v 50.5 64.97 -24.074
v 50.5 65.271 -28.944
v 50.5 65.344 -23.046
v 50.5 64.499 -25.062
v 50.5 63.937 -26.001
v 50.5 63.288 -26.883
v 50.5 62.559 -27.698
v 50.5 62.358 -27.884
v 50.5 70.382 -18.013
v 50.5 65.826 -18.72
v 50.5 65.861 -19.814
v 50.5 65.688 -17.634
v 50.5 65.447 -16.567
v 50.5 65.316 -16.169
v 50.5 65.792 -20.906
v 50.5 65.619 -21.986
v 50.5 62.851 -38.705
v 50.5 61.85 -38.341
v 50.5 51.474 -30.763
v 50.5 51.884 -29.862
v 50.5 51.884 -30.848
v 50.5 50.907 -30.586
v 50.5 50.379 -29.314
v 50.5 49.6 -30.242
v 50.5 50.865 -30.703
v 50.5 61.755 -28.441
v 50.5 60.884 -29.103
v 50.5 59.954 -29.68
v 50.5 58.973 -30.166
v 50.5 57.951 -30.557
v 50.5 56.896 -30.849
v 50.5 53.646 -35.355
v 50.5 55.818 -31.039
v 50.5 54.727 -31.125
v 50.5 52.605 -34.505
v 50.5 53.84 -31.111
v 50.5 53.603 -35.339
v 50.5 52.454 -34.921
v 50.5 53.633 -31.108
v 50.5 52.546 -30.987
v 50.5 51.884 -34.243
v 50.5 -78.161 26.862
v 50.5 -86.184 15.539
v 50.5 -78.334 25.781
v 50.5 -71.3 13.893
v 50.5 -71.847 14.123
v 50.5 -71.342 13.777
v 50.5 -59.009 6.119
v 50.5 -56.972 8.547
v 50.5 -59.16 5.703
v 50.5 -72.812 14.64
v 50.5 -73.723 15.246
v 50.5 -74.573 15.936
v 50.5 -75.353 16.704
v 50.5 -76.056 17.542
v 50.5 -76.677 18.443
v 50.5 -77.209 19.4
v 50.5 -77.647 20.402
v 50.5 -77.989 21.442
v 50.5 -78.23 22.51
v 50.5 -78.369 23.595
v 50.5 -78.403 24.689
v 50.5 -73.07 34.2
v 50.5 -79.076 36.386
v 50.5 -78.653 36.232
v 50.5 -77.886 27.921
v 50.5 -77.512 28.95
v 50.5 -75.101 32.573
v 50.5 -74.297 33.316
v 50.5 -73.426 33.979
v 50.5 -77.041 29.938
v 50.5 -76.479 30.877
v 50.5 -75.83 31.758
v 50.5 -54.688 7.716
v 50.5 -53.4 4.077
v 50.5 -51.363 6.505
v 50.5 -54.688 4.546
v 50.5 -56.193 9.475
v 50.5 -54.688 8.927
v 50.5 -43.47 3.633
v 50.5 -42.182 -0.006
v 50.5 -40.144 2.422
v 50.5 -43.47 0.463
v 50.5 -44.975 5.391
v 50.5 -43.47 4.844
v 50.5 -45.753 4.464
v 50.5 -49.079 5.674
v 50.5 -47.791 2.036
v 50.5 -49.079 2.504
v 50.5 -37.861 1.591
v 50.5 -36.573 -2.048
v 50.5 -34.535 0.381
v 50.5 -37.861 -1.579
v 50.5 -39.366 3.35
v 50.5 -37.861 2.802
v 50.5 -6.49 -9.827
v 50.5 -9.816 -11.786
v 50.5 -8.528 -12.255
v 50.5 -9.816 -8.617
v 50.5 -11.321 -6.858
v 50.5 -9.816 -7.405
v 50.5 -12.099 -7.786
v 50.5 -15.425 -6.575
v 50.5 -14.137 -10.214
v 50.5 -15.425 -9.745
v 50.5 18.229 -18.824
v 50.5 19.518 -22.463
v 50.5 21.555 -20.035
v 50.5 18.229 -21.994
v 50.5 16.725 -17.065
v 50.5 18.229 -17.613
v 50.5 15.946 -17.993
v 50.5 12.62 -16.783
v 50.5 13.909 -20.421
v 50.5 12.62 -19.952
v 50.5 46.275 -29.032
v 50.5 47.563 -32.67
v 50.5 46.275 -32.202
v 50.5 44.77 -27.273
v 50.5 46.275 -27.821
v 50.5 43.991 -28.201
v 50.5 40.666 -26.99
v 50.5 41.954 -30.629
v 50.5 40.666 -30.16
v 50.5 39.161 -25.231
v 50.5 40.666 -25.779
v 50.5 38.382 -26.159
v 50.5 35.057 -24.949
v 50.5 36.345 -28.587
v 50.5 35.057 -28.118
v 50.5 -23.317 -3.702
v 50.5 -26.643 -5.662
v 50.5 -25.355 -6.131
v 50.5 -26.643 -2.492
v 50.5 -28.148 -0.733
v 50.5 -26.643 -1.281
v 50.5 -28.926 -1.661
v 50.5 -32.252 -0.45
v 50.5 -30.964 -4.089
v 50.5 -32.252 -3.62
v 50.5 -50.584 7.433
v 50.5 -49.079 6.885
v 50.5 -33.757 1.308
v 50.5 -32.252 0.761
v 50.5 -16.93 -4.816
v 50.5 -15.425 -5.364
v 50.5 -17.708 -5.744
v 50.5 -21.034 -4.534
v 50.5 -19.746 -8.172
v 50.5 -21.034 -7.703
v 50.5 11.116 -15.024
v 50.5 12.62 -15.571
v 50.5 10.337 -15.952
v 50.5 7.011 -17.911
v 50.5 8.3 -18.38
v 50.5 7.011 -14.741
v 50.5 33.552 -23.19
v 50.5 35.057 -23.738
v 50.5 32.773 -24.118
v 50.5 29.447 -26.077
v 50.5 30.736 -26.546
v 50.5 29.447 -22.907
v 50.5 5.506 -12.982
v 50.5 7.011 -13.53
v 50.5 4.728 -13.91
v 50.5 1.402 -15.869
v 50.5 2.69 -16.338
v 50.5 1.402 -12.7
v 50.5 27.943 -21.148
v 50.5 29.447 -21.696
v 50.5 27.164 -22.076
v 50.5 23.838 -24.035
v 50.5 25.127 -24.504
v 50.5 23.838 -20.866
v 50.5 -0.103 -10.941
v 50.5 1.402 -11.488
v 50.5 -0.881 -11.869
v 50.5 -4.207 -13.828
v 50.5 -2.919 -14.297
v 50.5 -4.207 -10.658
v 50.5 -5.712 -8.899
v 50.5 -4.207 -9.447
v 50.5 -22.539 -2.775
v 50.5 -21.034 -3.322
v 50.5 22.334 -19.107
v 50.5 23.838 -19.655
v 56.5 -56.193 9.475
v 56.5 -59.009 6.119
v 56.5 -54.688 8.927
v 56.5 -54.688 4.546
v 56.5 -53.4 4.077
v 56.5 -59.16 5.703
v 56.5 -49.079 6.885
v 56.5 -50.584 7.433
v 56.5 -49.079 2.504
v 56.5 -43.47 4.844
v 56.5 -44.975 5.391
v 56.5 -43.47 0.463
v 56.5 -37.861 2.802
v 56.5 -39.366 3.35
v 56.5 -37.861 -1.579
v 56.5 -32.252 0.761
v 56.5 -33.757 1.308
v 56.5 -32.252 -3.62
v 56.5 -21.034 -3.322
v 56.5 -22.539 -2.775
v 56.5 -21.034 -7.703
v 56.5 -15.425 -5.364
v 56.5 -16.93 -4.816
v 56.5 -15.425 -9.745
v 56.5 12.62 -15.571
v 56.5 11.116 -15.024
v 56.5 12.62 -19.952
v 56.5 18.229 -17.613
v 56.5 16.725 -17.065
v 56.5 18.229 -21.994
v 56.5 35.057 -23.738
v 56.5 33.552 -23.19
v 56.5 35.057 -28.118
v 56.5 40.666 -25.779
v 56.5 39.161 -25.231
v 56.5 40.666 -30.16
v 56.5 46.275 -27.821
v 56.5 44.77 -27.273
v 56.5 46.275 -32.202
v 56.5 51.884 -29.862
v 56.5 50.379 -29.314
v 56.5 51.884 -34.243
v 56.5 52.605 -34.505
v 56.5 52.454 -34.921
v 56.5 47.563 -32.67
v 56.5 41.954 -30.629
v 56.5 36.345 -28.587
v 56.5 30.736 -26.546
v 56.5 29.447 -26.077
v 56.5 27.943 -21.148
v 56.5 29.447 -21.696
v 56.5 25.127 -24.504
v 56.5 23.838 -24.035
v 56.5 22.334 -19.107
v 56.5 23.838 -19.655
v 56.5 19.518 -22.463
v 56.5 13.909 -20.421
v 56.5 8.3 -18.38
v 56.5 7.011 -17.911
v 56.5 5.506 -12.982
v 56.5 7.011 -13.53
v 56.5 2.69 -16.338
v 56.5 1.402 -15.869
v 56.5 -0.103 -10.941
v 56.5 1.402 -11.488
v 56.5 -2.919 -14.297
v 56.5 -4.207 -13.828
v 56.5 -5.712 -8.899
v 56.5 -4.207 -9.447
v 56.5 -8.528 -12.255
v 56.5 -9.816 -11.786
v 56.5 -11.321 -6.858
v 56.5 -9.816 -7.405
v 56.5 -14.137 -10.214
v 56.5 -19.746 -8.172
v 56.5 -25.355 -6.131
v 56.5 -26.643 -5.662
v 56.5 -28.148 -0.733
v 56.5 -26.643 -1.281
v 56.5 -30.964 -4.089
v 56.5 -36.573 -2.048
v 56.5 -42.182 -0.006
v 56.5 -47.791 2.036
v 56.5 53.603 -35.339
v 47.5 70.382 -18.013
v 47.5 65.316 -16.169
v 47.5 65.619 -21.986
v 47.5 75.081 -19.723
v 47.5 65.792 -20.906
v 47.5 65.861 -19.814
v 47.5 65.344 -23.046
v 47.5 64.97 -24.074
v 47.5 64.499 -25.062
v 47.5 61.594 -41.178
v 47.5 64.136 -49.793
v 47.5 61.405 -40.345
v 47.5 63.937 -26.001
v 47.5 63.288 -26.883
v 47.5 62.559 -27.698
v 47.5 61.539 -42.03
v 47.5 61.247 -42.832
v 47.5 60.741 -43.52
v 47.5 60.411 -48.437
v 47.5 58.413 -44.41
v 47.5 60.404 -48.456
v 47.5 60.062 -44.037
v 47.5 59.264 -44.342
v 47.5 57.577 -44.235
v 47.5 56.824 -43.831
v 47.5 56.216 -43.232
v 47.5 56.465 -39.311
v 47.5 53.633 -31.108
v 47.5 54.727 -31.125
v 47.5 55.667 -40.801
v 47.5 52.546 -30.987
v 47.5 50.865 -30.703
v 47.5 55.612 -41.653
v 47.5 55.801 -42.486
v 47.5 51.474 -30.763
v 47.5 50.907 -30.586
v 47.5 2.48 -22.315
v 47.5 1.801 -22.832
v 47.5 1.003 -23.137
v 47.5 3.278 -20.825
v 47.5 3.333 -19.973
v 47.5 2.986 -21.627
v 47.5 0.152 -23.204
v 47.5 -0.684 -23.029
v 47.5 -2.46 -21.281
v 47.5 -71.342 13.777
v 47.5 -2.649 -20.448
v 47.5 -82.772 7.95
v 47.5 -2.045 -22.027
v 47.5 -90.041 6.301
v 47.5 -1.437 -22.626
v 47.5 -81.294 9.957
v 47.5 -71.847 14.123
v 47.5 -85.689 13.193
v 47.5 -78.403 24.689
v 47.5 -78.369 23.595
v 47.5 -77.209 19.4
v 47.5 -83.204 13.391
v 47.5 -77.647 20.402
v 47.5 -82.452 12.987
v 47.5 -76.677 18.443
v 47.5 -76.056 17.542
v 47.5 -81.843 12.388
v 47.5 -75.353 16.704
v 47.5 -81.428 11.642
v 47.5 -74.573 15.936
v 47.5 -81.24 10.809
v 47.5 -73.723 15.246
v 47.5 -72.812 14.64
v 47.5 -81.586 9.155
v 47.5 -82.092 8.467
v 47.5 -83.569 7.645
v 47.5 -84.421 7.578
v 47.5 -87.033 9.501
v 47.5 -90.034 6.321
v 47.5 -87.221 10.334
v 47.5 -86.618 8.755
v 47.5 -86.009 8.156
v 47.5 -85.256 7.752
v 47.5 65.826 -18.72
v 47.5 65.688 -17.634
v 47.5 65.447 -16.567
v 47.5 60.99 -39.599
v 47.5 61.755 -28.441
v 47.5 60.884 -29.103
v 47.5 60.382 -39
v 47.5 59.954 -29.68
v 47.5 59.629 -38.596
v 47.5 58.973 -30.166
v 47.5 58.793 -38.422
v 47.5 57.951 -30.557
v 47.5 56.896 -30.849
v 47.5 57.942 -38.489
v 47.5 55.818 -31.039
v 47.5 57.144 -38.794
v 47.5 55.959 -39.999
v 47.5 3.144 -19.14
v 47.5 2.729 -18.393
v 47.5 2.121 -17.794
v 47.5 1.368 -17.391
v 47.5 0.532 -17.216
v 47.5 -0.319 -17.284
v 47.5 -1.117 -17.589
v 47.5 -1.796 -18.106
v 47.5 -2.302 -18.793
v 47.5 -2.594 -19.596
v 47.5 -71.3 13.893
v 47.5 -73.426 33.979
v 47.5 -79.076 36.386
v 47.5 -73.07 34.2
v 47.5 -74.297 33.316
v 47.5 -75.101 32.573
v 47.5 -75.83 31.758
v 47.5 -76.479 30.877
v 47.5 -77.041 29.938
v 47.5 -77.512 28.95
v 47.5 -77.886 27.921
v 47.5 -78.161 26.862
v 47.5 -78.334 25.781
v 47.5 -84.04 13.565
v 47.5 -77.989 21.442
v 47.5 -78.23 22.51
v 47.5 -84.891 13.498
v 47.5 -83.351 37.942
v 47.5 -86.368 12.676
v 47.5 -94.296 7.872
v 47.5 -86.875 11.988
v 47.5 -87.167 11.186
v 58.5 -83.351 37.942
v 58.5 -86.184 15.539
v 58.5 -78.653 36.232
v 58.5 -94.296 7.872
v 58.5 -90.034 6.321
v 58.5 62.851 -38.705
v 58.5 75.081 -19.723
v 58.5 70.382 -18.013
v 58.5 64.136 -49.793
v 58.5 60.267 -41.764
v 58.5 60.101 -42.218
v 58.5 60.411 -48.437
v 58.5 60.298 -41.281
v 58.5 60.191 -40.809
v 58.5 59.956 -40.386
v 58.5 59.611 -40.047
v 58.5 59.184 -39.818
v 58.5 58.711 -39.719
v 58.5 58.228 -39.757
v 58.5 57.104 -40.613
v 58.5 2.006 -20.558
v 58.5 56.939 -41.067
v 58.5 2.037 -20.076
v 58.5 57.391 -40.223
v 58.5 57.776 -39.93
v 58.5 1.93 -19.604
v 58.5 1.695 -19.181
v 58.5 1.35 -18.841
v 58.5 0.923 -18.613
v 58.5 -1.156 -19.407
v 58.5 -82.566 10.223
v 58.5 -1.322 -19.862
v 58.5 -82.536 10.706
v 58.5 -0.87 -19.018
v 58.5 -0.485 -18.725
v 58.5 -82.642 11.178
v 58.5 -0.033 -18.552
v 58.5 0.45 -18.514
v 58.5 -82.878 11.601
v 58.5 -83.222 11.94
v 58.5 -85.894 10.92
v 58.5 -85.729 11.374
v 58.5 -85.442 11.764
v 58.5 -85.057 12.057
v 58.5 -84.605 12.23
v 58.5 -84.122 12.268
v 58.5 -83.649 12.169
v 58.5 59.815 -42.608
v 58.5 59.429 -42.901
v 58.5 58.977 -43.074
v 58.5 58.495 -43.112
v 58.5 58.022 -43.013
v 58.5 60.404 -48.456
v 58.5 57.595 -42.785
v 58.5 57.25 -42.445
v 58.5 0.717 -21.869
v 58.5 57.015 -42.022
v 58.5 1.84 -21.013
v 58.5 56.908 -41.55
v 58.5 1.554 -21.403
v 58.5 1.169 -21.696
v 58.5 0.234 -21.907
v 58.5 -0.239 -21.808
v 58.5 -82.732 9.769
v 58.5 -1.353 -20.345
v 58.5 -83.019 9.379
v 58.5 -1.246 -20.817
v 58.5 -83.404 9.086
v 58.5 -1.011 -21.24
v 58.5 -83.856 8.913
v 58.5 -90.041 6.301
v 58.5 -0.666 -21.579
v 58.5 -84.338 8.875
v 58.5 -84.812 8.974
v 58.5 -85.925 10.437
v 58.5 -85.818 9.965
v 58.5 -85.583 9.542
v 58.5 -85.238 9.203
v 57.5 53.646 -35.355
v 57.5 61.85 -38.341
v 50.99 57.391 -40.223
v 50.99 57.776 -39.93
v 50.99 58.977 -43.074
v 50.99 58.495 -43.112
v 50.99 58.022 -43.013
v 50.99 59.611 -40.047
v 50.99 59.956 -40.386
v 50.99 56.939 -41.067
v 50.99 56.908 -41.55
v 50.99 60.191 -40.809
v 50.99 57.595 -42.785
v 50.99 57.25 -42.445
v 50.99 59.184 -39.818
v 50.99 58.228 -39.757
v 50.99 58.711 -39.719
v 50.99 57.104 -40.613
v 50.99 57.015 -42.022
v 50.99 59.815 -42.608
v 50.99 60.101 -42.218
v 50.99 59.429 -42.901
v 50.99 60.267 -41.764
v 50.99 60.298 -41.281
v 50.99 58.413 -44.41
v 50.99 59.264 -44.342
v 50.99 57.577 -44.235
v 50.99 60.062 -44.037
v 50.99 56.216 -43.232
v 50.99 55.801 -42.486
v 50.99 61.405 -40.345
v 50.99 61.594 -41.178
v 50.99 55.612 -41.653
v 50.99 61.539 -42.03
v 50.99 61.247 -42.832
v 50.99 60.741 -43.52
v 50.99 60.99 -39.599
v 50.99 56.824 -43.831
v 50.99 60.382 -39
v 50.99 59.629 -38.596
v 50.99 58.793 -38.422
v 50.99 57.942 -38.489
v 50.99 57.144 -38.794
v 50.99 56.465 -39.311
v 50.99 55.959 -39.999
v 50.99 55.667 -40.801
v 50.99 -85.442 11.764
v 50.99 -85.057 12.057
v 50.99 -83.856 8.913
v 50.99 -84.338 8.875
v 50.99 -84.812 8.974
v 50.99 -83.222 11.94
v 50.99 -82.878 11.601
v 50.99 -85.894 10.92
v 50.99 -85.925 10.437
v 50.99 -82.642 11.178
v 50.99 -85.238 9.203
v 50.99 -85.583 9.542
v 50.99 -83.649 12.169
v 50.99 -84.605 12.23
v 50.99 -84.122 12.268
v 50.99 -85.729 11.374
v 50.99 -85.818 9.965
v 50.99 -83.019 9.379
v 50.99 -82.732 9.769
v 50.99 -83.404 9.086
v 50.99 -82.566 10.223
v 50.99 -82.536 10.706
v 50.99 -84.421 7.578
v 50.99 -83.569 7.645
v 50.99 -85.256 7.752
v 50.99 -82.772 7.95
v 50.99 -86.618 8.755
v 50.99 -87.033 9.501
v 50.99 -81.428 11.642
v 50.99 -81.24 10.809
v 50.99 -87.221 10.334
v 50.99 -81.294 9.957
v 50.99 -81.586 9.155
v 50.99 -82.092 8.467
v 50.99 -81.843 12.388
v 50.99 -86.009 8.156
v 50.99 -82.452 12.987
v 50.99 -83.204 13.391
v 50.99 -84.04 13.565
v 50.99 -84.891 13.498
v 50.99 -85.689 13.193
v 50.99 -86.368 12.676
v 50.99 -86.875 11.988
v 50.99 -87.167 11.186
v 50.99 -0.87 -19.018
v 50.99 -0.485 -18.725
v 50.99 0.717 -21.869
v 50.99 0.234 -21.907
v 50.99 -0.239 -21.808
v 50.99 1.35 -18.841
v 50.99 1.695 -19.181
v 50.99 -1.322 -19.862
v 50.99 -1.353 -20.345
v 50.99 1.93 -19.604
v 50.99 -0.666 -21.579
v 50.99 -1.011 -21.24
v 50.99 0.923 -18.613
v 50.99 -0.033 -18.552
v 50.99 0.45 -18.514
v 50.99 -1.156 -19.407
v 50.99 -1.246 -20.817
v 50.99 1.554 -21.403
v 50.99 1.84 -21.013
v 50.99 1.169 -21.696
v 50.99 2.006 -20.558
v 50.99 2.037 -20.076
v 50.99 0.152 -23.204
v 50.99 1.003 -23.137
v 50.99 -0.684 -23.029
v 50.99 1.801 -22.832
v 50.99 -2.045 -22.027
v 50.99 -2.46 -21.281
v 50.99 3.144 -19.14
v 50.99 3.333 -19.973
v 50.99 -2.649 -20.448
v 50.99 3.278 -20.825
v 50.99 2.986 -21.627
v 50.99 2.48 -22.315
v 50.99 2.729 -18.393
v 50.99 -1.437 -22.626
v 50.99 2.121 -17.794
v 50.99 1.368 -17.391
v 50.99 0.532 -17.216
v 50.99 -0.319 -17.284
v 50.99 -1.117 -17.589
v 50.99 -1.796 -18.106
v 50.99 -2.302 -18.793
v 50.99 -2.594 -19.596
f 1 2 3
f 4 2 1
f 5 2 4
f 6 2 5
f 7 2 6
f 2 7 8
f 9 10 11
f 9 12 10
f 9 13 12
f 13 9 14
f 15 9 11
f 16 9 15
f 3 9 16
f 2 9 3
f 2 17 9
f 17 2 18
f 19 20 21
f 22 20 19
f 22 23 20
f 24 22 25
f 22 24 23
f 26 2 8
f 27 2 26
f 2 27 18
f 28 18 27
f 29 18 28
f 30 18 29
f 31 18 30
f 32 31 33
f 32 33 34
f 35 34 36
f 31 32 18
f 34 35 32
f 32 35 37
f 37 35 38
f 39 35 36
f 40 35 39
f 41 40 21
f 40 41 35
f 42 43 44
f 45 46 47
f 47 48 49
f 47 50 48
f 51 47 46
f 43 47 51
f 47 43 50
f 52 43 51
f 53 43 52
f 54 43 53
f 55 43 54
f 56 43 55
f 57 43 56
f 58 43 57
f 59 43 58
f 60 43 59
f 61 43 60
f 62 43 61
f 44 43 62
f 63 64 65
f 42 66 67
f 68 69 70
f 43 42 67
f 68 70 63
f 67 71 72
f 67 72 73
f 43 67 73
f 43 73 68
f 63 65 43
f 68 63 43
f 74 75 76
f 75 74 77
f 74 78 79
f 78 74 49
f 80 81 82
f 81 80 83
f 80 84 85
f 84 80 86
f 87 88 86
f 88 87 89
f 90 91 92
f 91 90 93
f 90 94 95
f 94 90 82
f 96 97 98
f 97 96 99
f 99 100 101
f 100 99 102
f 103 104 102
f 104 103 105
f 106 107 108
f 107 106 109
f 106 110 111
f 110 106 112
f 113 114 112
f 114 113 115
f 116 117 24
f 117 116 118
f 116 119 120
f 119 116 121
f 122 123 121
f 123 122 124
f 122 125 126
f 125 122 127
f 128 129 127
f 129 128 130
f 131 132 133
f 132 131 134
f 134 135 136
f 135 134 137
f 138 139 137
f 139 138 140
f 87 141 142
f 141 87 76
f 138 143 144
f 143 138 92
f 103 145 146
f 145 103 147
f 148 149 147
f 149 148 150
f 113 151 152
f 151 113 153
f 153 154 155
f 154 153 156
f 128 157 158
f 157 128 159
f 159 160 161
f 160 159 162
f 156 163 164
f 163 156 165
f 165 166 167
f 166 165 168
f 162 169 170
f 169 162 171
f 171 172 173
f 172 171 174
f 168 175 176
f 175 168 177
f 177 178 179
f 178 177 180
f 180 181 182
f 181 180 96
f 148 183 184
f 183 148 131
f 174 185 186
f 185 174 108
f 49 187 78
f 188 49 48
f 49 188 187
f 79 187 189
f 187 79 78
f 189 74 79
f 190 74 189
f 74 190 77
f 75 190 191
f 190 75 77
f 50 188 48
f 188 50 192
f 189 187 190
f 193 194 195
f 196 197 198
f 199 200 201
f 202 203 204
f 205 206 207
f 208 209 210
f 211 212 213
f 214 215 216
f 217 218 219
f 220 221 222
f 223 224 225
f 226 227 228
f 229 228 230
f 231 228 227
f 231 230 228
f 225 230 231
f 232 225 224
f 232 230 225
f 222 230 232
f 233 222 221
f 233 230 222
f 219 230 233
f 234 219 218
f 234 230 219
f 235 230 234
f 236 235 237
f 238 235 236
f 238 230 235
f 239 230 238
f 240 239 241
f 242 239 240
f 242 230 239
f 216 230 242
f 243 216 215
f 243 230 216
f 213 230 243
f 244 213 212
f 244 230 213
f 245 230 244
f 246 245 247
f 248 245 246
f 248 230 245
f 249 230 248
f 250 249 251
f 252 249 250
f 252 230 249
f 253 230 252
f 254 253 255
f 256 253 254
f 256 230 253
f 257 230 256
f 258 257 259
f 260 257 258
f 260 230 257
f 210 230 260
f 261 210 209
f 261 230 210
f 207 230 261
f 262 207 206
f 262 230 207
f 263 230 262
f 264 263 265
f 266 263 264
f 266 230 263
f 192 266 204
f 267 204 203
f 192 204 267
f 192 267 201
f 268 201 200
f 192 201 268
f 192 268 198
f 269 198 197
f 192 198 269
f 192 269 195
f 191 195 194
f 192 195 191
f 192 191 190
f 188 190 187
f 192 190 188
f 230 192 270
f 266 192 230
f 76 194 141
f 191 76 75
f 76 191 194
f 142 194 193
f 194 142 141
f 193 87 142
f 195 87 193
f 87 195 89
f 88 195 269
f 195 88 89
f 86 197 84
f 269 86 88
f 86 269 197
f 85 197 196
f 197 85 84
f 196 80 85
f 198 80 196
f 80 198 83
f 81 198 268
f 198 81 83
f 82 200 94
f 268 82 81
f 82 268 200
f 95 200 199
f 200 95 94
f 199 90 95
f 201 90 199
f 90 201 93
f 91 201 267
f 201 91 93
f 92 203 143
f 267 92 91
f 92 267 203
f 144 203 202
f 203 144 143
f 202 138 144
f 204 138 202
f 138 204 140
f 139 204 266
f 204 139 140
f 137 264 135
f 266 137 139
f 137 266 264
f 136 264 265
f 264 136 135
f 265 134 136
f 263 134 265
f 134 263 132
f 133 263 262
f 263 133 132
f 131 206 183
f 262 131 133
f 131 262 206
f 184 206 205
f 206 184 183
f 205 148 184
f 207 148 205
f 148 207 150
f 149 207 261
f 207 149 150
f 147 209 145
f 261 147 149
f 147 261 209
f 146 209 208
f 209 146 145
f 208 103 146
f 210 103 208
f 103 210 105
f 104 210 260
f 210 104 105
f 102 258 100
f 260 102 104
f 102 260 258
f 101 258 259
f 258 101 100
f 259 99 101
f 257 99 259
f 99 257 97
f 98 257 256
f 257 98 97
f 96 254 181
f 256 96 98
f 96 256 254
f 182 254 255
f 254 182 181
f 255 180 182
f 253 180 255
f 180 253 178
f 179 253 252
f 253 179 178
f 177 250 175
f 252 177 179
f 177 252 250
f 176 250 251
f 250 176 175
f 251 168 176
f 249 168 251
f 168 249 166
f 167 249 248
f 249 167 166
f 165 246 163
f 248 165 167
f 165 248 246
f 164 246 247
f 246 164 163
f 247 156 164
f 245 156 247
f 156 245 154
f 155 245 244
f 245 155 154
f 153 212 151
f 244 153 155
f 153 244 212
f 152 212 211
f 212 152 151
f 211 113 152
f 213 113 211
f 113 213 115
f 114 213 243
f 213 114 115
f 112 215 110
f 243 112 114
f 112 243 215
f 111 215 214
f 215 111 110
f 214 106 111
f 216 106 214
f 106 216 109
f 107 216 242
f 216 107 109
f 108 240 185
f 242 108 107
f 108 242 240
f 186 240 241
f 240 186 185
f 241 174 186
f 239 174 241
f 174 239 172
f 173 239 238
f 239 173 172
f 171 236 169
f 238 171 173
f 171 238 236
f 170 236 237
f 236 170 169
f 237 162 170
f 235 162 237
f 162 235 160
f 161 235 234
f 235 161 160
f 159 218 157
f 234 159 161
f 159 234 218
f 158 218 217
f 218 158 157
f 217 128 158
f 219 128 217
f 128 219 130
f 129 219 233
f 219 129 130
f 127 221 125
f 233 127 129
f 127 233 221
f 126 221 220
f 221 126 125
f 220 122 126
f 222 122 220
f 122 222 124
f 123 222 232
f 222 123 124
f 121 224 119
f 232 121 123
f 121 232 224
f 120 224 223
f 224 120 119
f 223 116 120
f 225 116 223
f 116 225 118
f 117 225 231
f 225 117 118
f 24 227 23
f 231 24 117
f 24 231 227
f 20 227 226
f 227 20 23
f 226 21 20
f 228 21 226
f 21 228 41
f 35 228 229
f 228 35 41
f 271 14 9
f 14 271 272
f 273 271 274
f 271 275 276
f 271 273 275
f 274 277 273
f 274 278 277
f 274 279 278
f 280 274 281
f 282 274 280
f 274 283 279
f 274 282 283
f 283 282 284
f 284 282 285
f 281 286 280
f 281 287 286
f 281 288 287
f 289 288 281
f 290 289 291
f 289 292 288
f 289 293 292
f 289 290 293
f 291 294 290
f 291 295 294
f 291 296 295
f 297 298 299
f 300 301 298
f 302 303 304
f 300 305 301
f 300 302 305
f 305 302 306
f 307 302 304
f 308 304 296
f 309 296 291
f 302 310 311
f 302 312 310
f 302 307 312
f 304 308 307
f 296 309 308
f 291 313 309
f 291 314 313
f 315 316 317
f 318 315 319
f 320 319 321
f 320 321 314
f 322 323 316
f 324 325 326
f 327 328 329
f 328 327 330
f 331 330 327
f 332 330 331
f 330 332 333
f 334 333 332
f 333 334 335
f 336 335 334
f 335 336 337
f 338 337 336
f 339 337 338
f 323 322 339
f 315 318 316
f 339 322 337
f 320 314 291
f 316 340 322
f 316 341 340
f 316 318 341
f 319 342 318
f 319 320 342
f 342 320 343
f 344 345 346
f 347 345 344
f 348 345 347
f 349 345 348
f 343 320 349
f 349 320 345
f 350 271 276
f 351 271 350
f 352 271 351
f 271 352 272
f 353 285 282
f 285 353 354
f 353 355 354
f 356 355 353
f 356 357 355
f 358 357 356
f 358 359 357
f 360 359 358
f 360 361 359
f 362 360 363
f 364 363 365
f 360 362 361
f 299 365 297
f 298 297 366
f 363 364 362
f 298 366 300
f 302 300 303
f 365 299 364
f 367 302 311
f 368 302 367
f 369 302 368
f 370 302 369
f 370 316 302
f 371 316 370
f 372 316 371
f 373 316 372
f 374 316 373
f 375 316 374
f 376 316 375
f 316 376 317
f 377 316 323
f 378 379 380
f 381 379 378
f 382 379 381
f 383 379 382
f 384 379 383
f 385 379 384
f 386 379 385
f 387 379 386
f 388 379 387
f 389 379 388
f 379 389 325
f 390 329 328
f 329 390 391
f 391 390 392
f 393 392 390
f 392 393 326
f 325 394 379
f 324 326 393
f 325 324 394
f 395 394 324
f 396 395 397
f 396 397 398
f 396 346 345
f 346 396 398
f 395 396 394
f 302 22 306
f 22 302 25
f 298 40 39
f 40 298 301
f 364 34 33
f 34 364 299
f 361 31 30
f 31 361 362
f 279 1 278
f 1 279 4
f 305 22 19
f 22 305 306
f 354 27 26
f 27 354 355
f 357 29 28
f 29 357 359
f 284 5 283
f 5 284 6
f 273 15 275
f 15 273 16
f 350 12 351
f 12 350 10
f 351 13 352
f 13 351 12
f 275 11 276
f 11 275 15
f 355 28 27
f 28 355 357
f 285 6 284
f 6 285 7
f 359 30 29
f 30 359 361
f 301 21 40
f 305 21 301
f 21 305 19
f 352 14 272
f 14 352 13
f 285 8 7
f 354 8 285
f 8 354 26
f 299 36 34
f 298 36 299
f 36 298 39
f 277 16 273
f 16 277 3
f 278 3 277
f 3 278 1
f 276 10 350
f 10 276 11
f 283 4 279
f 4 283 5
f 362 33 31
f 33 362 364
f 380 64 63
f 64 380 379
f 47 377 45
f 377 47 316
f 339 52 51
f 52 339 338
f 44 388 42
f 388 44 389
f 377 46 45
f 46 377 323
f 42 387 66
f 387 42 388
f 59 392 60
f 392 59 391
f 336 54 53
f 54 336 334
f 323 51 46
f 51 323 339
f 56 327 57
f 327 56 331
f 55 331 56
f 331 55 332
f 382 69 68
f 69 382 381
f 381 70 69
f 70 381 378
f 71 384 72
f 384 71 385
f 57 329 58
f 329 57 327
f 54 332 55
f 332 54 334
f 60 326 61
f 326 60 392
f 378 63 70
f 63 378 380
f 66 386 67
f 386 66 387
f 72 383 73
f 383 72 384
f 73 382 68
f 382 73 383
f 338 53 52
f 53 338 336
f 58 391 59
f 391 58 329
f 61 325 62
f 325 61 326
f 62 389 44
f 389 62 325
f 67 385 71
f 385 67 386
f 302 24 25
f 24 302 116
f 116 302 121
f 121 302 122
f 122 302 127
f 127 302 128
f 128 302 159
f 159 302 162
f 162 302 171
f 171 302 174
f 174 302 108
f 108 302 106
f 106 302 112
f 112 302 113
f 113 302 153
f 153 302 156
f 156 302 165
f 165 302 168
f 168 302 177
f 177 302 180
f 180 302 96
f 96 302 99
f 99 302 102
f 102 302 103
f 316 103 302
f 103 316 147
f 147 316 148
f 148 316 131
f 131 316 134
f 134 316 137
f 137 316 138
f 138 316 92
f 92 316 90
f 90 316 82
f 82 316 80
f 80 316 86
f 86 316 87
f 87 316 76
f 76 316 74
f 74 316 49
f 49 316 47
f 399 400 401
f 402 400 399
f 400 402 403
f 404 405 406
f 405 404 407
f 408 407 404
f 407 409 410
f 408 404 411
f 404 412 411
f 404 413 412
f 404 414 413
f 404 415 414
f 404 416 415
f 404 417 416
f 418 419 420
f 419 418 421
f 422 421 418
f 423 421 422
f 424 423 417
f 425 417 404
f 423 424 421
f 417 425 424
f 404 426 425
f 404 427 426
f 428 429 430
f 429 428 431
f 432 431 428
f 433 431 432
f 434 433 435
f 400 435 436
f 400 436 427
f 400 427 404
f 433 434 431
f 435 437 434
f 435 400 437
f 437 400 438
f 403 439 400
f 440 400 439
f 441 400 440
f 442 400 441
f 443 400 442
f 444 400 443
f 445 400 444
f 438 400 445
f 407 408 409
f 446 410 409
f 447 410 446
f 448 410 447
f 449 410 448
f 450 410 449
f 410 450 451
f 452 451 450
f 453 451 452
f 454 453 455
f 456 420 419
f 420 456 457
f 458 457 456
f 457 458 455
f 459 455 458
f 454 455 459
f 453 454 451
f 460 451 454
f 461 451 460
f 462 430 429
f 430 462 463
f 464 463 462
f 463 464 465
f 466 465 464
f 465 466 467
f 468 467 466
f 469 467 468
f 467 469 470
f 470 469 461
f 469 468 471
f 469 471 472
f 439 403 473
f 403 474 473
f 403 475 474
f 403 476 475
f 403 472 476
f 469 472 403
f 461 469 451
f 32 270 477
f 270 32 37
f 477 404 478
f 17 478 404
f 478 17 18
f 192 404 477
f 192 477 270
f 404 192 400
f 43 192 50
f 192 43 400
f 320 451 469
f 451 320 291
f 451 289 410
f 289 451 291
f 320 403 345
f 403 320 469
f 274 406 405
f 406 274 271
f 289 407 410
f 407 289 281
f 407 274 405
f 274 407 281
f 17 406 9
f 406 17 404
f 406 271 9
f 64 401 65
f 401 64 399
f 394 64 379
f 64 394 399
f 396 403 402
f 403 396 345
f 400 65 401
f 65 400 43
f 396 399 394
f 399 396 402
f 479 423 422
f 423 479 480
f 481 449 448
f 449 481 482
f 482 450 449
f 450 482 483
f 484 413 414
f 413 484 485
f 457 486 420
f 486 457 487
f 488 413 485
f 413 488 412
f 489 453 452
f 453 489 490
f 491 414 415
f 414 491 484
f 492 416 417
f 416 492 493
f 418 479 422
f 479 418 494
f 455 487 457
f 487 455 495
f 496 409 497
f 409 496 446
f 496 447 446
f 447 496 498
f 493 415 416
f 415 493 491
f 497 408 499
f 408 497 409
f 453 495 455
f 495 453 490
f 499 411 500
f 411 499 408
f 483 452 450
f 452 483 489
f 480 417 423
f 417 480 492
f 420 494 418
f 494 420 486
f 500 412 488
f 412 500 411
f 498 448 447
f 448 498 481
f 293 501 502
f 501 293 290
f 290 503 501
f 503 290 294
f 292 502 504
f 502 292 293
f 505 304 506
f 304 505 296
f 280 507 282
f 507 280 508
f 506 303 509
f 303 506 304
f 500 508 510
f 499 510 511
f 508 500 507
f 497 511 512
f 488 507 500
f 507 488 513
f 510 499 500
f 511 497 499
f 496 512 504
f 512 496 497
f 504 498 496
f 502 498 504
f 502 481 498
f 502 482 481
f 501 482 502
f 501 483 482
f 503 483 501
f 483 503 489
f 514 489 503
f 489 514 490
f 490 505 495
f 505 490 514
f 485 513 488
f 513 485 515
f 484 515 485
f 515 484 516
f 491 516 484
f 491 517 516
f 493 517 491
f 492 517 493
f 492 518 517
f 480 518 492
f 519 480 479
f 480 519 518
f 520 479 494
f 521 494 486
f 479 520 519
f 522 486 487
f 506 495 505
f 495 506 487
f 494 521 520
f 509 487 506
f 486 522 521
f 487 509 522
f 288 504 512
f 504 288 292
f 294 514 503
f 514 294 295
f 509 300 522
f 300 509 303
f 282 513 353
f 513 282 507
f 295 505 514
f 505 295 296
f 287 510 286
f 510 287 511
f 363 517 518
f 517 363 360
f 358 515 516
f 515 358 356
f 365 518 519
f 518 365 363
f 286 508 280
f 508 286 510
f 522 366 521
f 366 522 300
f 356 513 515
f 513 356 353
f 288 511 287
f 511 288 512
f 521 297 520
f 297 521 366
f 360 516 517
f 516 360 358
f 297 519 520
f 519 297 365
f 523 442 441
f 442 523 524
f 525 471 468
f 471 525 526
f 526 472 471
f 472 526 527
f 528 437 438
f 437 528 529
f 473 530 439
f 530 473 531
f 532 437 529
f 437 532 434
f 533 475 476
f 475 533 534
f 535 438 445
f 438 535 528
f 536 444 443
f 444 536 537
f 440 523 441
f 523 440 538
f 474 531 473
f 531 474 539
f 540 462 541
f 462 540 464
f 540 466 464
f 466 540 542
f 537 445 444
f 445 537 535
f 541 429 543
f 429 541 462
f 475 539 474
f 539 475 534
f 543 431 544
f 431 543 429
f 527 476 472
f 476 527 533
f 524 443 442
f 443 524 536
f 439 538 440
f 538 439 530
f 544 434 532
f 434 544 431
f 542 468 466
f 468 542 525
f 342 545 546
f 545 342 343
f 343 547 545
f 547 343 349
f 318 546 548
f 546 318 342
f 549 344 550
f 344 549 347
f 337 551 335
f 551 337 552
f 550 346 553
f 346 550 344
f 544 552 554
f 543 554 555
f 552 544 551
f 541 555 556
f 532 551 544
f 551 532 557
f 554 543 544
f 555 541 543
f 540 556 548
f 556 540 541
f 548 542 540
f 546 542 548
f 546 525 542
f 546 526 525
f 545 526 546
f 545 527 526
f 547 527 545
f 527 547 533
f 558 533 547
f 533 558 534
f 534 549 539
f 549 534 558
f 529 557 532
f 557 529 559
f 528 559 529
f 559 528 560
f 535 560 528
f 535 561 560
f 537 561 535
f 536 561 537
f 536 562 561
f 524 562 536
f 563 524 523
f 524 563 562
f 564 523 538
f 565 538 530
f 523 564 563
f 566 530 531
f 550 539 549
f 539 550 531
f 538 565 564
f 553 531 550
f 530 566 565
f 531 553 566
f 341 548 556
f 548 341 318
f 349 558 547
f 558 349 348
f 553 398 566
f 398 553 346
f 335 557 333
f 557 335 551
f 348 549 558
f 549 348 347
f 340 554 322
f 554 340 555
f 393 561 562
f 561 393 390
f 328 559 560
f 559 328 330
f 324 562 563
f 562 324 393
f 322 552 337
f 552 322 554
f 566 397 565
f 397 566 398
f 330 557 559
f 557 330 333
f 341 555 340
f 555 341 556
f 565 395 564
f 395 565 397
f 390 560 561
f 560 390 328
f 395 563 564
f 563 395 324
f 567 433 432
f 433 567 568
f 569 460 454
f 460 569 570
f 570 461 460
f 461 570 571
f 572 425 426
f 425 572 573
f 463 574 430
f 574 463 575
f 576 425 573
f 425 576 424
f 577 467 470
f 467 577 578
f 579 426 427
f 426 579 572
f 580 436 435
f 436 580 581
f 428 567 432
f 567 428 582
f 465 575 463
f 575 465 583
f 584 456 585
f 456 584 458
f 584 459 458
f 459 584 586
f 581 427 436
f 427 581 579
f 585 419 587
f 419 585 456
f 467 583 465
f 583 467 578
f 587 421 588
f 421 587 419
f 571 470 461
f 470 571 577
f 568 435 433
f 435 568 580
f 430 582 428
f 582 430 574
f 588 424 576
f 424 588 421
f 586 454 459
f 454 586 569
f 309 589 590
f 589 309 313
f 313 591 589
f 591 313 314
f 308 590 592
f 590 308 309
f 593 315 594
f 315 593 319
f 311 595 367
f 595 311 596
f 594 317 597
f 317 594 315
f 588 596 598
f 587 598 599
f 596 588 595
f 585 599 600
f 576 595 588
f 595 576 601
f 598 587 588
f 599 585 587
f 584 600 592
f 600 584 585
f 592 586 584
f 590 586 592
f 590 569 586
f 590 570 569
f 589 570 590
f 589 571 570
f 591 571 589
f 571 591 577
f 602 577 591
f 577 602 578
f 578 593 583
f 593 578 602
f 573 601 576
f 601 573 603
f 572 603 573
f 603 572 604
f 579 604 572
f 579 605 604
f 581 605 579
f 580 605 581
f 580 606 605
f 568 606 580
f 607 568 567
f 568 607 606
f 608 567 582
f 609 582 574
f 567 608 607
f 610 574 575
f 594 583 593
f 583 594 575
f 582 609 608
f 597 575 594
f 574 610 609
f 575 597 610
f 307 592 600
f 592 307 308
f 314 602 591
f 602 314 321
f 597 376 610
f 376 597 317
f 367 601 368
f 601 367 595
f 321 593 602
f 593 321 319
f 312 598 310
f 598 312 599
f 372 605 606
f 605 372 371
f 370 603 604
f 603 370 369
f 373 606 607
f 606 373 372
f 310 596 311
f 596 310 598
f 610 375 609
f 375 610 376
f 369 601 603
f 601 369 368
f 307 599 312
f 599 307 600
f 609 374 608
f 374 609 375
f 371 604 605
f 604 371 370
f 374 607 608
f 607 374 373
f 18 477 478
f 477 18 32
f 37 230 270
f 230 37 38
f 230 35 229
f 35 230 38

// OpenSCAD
// file: ../Parts/rounder.scad
// rounder.scad
// cutting tool for rounding off corners with a cylinder

//---------------------
module rounder(
r=10,   // radius
h=10,   // height
f=22,    // $fn
extra=0.01  // extra size for the cube
){

difference(){
  translate([-extra,-extra,-extra])
  cube([r+extra,r+extra,h+2*extra]);
  translate([r,r,-1])
  cylinder(r=r,h=h+2,$fn=f);
}

}

//---------------------------------------------------------------------------
module bevel(x=1,y=1,h=10){

linear_extrude(height=h)
polygon(points=[[0,0],[x,0],[0,y]]);
    
}
  

//========================

rounder();

//========================
// main file
//======================================================================
// RewinderRamp.scad
//
// New version of the filament spool rewinder.
//
// DrTomFlint 26 June 2023
//
//======================================================================


use <../Parts/rounder.scad>
use <../Parts/threads.scad>
use <../Gears/gears.scad>

// draft setting removes threads
draft=0;

// spool
//wide=62;		// width of a spool
wide=75;      // wider spools for the UV filament
r0=100;     // radius of spool
wall=4.5;   // thickness of spool wall
bore=54.5/2;  // radius of bore hole

// main shaft
r1=16;        // radius of the main shaft
x1=95;        // length of main shaft
x1b=20;       // length of thread on shaft2
r2=8;         // radius of gear-shaft inserts

// taper nuts on main shaft
r3=20;        // radius of nut body
r4=40;        // radius of nut wings
r5=12;        // taper cut radius

// lock nut
r6=20;        // radius of nut body
r7=30;        // radius of wings

// spur gears
xroller=3;
rroller=11.5;
rlip=13.75;
xgear=6;

// rack beam
slope = 20;
//xrack = 148;
xrack = 120;

// box outer dimensions
bx1=123.5;
by1=340;
bz1=150;
  
bx2=123.5;
by2=340;
bz2=260;

// 5 boxes together on x-axis is 617 mm
// use a single wall between compartments lowers that by 4*3=12 mm,
// to get 605 mm total x-axis.  y remains single 340, z at 260 to 
// include the top and make a full enclosure.
  
F1=201;
F2=66;

//----------------------------------------------------------------------
module spool(pos=0){

  translate([0,pos*cos(slope),-pos*sin(slope)])

translate([wide/2,0,0])
rotate([0,-90,0])
difference(){
  union(){
    cylinder(r=r0,h=wall,$fn=F2);
    translate([0,0,wall])
    cylinder(r=bore+wall,h=wide-2*wall,$fn=F2);
    translate([0,0,wide-wall])
    cylinder(r=r0,h=wall,$fn=F2);
  }
  translate([0,0,-1])
  cylinder(r=bore,h=wide+2,$fn=F2);
}

}


//----------------------------------------------------------------------
// 2:32 to render make one set of threads be backwards so pulling on the
// spool will tighten both ends.  Color code the spurs and nuts.
module shaft2(pos=0){

  translate([0,pos*cos(slope),-pos*sin(slope)])

  difference(){
    union(){
      // threaded end
      translate([-x1/2,0,0])
      rotate([0,90,0])
      if(draft==1){
        cylinder(r=r1,h=x1,$fn=F2);
      }else{
        metric_thread (diameter=2*r1, pitch=3, length=x1/3, internal=false, n_starts=1, thread_size=-1, groove=false, square=false, rectangle=0,angle=30, taper=0, leadin=2, leadfac=1.0, test=false);
      }
      mirror([1,0,0])
      translate([-x1/2,0,0])
      rotate([0,90,0])
      if(draft==1){
        cylinder(r=r1,h=x1,$fn=F2);
      }else{
        metric_thread (diameter=2*r1, pitch=3, length=x1/3, internal=false, n_starts=1, thread_size=-1, groove=false, square=false, rectangle=0,angle=30, taper=0, leadin=2, leadfac=1.0, test=false);
      }
      translate([0,0,0])
      rotate([0,90,0])
      cylinder(r=r1,h=x1/3,$fn=F2,center=true);
    }
    
    // cuts to insert gear ends
    translate([-x1/2-0.1,0,0])
    rotate([0,90,0])
    cylinder(r=r2,h=10.2,$fn=6);

    translate([x1/2+0.1,0,0])
    rotate([0,-90,0])
    cylinder(r=r2,h=10.2,$fn=6);
    
    // center cuts to allow an M3 bolt to strengthen attachment of spurs
    rotate([0,-90,0])
    cylinder(r=1.7,h=x1+20,$fn=22,center=true);
    
  }
    
    
}

//----------------------------------------------------------------------
// straight = red right side
// mirror = green left side
module nut(pos=0){

  translate([0,pos*cos(slope),-pos*sin(slope)])

//  translate([x1/2-25,0,0])
  translate([wide/2-10,0,0])
  rotate([0,90,0])
  difference(){
    cylinder(r=r4,h=14,$fn=99);
    
    translate([0,0,-1])
    rotate_extrude($fn=99)
    translate([r4+2,0,0])
    scale([1.8,1])
    circle(r=r5,$fn=88);
    
    // main bore
    translate([0,0,-0.1])
    if(draft==1){
      cylinder(r=r1+0.4, h=x1);
    }else{
      metric_thread (diameter=2*r1+0.4, pitch=3, length=x1, internal=true, n_starts=1, thread_size=-1, groove=false, square=false, rectangle=0,angle=30, taper=0, leadin=0, leadfac=1.0, test=false);
    }
    
// cuts for wings
    for(i=[0:4]){
      rotate([0,0,i*72])
      translate([r4,0,12])
      scale([1,1.4,1])
      cylinder(r=10,h=6,center=true,$fn=99);
    }
  }
  
}  

//----------------------------------------------------------------------
// make a locking nut
module nut2(pos=0){

  translate([0,pos*cos(slope),-pos*sin(slope)])

  translate([x1/2-7,0,0])
  rotate([0,90,0])
  difference(){
    union(){
      cylinder(r1=r6,r2=r7,h=4,$fn=44);
      translate([0,0,4])
      cylinder(r=r7,h=2,$fn=44);
    }
    
    // main bore
    translate([0,0,-0.1])
    if(draft==1){
      cylinder(r=r1+0.4, h=x1);
    }else{
      metric_thread (diameter=2*r1+0.4, pitch=3, length=x1, internal=true, n_starts=1, thread_size=-1, groove=false, square=false, rectangle=0,angle=30, taper=0, leadin=3, leadfac=1.0, test=false);
    }
    
// cuts for wings
    for(i=[0:4]){
      rotate([0,0,i*72])
      translate([r4-10,0,6])
      scale([1,1.4,1])
      cylinder(r=10,h=16,center=true);
    }
  }
  
}  

//----------------------------------------------------------------------
module spur(pos=0){

  translate([0,pos*cos(slope),-pos*sin(slope)])
  
  difference(){
    union(){
      // insert into shaft
      translate([x1/2-xgear-2,0,0])
      rotate([0,90,0])
      cylinder(r=r2-0.15,h=9,$fn=6);
      

      // roller section
      translate([x1/2,0,0])
      rotate([0,90,0])
      cylinder(r=rroller,h=xroller,$fn=F1);

      // gear
      translate([x1/2+xroller,0,0])
      rotate([0,90,0])
      
      // rotate gear to mesh with rack here
      rotate([0,0,17])
      spur_gear (modul=2, tooth_number=12, width=xgear, bore=2, pressure_angle=20, helix_angle=0, optimized=false);

      // overhanging lip section
      translate([x1/2+xroller+xgear,0,0])
      rotate([0,90,0])
      cylinder(r=rlip,h=1,$fn=F2);
    }
    
    // cut a center hole
    rotate([0,90,0])
    cylinder(r=1.7,h=x1+40,$fn=F2,center=true);
  }

}

//----------------------------------------------------------------------
module beam(){

intersection(){
  union(){
    // rack
    translate([x1/2+xroller,0,-13])
    rotate([90-slope,0,0])
    rotate([0,90,0])
    rack(modul=2, length=xrack, height=12, width=xgear-0.3, pressure_angle=20, helix_angle=0);

    // roller section  
    translate([x1/2+xroller/2+0.1,0,-19])
    rotate([-slope,0,0])
    translate([0,-3.2,0])  
    cube([xroller,xrack,12.8],center=true);
  }
  // trimming rack and roller with intersection
  translate([x1/2+xroller/2+0.1,0,-19])
  rotate([-slope,0,0])
  translate([0,-3.2,0.2])  
  cube([xroller+20,xrack-1,12.8],center=true);
}

}


//----------------------------------------------------------------------
// straight = green left side
// mirror = red right side
module beam3(){

difference(){
  union(){
    // rack
    translate([x1/2+xroller,0,-13])
    rotate([90-slope,0,0])
    rotate([0,90,0])
    rack(modul=2, length=xrack, height=12, width=xgear, pressure_angle=20, helix_angle=0);

    // roller section  
    translate([x1/2+xroller/2,0,-19])
    rotate([-slope,0,0])
    translate([0,-3.2-10,0])  
    cube([xroller,xrack+40,12.8],center=true);

    // thicken ends
    translate([x1/2+xroller/2,0,-21.15])
    rotate([-slope,0,0])
    translate([4,-14+0.05,0])  
    cube([xroller+xgear+2,xrack+40+0.1,10],center=true);

    // lower roller stop  
    translate([x1/2+xroller/2,0,-19])
    rotate([-slope,0,0])
    translate([0,xrack/2-0.7,15])  
    difference(){
      cube([xroller,15,20],center=true);

      translate([0,-8,3])
      rotate([0,90,0])
      cylinder(r=rroller,h=xroller+1,center=true,$fn=F2);
    }
    
    // upper roller stop  
    translate([x1/2+xroller/2,0,-19])
    rotate([-slope,0,0])
    translate([0,-xrack/2-25.75,15])  
    difference(){
      cube([xroller,15,20],center=true);

      translate([0,8,3])
      rotate([0,90,0])
      cylinder(r=rroller,h=xroller+1,center=true,$fn=F2);
    }
    
    // lower L bracket
    translate([x1/2+xroller/2+xgear/2,0,-19])
    rotate([-slope,0,0])
    translate([1,xrack/2-0.7+9,9])  
    cube([xroller+xgear+2,5,32],center=true);

    // upper L bracket
    translate([x1/2+xroller/2+xgear/2,0,-19])
    rotate([-slope,0,0])
    translate([1,-xrack/2+0.7-36,9])  
    cube([xroller+xgear+2,5,32],center=true);

  }   // end of union

  // cuts to mount with M3, bolt and head clearance
  translate([x1/2+xroller/2,0,-21.15])
  rotate([-slope,0,0])
  translate([3,xrack/2+2,1])  
  rotate([0,90,0]){
    cylinder(r=1.7,h=20,center=true,$fn=22);
    translate([0,0,-2.76])  
    cylinder(r=3,h=3.5,center=true,$fn=22);
  }
  
  translate([x1/2+xroller/2,0,-21.15])
  rotate([-slope,0,0])
  translate([3,-xrack/2-30,1])  
  rotate([0,90,0]){
    cylinder(r=1.7,h=20,center=true,$fn=22);
    translate([0,0,-2.76])  
    cylinder(r=3,h=3.5,center=true,$fn=22);
  }

  translate([x1/2+xroller/2,0,-21.15])
  rotate([-slope,0,0])
  translate([3,0,1])  
  rotate([0,90,0]){
    cylinder(r=1.7,h=20,center=true,$fn=22);
    translate([0,0,-2.76])  
    cylinder(r=3,h=3.5,center=true,$fn=22);
  }

  // trim off extra tooth
  translate([x1/2+xroller/2,0,-21.15])
  rotate([-slope,0,0])
  translate([5,xrack/2-1,10])  
  cube([xgear+1,10,10],center=true);

}

}

//----------------------------------------------------------------------
module box1(thick=3){
  
  translate([0,-5,0])
  difference(){
    translate([0,0,-0.35*bz1])
    cube([bx1,by1,bz1],center=true);
    translate([0,0,-0.35*bz1+thick])
    cube([bx1-2*thick,by1-2*thick,bz1],center=true);

    translate([0,0,0.45*bz1])
    rotate([-slope,0,0])
    cube([bx1+20,by1+100,bz1],center=true);
  }
  
  
}

//----------------------------------------------------------------------
module box2(thick=3){
  
  translate([0,-5,0])
  difference(){
    translate([0,0,3])
    cube([bx2,by2,bz2],center=true);
    translate([0,0,3+thick])
    cube([bx2-2*thick,by2-2*thick,bz2],center=true);

    translate([0,0,0.5*bz2])
    rotate([-slope,0,0])
    cube([bx2+20,by2+120,bz2],center=true);
  }
  
  
}

//----------------------------------------------------------------------
module top2(thick=3){
  
  translate([0,-5,0])
  intersection(){
    difference(){
      translate([0,0,3])
      cube([bx2,by2,bz2],center=true);
      translate([0,0,3-thick])
      cube([bx2-2*thick,by2-2*thick,bz2],center=true);
      hull(){
        translate([0,-by2/2,bz2/2-10])
        rotate([90,0,0])
        cylinder(r=1.5,$fn=22,h=20,center=true);
        translate([0,-by2/2,bz2/2-40])
        rotate([90,0,0])
        cylinder(r=1.5,$fn=22,h=20,center=true);
      }
    }
    translate([0,0,0.5*bz2])
    rotate([-slope,0,0])
    cube([bx2+20,by2+120,bz2],center=true);
  }
    
}

  
//======================================================================

// spur position +57 bottom, -68 is the top
//pos1=-68;
pos1=57;

// cutaway view of the box
if(0){
  difference(){
    union(){
      box2();
      //top2();
    }
    translate([0,by1/2+6.9,0])
    cube([bx2+20,30,bz2+20],center=true);
    translate([bx1/2+6.9,0,0])
    cube([20,by2+20,bz2+20],center=true);
  }
}

//box1();
//top2();

//color("gray",alpha=0.3)
//spool(pos=pos1);

//shaft2(pos=pos1);

//nut(pos=pos1);
//mirror([1,0,0]) nut(pos=pos1);

//nut2(pos=pos1);
//mirror([1,0,0]) nut2();

//color("cyan")
//spur(pos=pos1);
//mirror([1,0,0]) spur(pos=pos1);

//color("gray",alpha=0.3)
beam3();
//mirror([1,0,0]) beam3();


//======================================================================
